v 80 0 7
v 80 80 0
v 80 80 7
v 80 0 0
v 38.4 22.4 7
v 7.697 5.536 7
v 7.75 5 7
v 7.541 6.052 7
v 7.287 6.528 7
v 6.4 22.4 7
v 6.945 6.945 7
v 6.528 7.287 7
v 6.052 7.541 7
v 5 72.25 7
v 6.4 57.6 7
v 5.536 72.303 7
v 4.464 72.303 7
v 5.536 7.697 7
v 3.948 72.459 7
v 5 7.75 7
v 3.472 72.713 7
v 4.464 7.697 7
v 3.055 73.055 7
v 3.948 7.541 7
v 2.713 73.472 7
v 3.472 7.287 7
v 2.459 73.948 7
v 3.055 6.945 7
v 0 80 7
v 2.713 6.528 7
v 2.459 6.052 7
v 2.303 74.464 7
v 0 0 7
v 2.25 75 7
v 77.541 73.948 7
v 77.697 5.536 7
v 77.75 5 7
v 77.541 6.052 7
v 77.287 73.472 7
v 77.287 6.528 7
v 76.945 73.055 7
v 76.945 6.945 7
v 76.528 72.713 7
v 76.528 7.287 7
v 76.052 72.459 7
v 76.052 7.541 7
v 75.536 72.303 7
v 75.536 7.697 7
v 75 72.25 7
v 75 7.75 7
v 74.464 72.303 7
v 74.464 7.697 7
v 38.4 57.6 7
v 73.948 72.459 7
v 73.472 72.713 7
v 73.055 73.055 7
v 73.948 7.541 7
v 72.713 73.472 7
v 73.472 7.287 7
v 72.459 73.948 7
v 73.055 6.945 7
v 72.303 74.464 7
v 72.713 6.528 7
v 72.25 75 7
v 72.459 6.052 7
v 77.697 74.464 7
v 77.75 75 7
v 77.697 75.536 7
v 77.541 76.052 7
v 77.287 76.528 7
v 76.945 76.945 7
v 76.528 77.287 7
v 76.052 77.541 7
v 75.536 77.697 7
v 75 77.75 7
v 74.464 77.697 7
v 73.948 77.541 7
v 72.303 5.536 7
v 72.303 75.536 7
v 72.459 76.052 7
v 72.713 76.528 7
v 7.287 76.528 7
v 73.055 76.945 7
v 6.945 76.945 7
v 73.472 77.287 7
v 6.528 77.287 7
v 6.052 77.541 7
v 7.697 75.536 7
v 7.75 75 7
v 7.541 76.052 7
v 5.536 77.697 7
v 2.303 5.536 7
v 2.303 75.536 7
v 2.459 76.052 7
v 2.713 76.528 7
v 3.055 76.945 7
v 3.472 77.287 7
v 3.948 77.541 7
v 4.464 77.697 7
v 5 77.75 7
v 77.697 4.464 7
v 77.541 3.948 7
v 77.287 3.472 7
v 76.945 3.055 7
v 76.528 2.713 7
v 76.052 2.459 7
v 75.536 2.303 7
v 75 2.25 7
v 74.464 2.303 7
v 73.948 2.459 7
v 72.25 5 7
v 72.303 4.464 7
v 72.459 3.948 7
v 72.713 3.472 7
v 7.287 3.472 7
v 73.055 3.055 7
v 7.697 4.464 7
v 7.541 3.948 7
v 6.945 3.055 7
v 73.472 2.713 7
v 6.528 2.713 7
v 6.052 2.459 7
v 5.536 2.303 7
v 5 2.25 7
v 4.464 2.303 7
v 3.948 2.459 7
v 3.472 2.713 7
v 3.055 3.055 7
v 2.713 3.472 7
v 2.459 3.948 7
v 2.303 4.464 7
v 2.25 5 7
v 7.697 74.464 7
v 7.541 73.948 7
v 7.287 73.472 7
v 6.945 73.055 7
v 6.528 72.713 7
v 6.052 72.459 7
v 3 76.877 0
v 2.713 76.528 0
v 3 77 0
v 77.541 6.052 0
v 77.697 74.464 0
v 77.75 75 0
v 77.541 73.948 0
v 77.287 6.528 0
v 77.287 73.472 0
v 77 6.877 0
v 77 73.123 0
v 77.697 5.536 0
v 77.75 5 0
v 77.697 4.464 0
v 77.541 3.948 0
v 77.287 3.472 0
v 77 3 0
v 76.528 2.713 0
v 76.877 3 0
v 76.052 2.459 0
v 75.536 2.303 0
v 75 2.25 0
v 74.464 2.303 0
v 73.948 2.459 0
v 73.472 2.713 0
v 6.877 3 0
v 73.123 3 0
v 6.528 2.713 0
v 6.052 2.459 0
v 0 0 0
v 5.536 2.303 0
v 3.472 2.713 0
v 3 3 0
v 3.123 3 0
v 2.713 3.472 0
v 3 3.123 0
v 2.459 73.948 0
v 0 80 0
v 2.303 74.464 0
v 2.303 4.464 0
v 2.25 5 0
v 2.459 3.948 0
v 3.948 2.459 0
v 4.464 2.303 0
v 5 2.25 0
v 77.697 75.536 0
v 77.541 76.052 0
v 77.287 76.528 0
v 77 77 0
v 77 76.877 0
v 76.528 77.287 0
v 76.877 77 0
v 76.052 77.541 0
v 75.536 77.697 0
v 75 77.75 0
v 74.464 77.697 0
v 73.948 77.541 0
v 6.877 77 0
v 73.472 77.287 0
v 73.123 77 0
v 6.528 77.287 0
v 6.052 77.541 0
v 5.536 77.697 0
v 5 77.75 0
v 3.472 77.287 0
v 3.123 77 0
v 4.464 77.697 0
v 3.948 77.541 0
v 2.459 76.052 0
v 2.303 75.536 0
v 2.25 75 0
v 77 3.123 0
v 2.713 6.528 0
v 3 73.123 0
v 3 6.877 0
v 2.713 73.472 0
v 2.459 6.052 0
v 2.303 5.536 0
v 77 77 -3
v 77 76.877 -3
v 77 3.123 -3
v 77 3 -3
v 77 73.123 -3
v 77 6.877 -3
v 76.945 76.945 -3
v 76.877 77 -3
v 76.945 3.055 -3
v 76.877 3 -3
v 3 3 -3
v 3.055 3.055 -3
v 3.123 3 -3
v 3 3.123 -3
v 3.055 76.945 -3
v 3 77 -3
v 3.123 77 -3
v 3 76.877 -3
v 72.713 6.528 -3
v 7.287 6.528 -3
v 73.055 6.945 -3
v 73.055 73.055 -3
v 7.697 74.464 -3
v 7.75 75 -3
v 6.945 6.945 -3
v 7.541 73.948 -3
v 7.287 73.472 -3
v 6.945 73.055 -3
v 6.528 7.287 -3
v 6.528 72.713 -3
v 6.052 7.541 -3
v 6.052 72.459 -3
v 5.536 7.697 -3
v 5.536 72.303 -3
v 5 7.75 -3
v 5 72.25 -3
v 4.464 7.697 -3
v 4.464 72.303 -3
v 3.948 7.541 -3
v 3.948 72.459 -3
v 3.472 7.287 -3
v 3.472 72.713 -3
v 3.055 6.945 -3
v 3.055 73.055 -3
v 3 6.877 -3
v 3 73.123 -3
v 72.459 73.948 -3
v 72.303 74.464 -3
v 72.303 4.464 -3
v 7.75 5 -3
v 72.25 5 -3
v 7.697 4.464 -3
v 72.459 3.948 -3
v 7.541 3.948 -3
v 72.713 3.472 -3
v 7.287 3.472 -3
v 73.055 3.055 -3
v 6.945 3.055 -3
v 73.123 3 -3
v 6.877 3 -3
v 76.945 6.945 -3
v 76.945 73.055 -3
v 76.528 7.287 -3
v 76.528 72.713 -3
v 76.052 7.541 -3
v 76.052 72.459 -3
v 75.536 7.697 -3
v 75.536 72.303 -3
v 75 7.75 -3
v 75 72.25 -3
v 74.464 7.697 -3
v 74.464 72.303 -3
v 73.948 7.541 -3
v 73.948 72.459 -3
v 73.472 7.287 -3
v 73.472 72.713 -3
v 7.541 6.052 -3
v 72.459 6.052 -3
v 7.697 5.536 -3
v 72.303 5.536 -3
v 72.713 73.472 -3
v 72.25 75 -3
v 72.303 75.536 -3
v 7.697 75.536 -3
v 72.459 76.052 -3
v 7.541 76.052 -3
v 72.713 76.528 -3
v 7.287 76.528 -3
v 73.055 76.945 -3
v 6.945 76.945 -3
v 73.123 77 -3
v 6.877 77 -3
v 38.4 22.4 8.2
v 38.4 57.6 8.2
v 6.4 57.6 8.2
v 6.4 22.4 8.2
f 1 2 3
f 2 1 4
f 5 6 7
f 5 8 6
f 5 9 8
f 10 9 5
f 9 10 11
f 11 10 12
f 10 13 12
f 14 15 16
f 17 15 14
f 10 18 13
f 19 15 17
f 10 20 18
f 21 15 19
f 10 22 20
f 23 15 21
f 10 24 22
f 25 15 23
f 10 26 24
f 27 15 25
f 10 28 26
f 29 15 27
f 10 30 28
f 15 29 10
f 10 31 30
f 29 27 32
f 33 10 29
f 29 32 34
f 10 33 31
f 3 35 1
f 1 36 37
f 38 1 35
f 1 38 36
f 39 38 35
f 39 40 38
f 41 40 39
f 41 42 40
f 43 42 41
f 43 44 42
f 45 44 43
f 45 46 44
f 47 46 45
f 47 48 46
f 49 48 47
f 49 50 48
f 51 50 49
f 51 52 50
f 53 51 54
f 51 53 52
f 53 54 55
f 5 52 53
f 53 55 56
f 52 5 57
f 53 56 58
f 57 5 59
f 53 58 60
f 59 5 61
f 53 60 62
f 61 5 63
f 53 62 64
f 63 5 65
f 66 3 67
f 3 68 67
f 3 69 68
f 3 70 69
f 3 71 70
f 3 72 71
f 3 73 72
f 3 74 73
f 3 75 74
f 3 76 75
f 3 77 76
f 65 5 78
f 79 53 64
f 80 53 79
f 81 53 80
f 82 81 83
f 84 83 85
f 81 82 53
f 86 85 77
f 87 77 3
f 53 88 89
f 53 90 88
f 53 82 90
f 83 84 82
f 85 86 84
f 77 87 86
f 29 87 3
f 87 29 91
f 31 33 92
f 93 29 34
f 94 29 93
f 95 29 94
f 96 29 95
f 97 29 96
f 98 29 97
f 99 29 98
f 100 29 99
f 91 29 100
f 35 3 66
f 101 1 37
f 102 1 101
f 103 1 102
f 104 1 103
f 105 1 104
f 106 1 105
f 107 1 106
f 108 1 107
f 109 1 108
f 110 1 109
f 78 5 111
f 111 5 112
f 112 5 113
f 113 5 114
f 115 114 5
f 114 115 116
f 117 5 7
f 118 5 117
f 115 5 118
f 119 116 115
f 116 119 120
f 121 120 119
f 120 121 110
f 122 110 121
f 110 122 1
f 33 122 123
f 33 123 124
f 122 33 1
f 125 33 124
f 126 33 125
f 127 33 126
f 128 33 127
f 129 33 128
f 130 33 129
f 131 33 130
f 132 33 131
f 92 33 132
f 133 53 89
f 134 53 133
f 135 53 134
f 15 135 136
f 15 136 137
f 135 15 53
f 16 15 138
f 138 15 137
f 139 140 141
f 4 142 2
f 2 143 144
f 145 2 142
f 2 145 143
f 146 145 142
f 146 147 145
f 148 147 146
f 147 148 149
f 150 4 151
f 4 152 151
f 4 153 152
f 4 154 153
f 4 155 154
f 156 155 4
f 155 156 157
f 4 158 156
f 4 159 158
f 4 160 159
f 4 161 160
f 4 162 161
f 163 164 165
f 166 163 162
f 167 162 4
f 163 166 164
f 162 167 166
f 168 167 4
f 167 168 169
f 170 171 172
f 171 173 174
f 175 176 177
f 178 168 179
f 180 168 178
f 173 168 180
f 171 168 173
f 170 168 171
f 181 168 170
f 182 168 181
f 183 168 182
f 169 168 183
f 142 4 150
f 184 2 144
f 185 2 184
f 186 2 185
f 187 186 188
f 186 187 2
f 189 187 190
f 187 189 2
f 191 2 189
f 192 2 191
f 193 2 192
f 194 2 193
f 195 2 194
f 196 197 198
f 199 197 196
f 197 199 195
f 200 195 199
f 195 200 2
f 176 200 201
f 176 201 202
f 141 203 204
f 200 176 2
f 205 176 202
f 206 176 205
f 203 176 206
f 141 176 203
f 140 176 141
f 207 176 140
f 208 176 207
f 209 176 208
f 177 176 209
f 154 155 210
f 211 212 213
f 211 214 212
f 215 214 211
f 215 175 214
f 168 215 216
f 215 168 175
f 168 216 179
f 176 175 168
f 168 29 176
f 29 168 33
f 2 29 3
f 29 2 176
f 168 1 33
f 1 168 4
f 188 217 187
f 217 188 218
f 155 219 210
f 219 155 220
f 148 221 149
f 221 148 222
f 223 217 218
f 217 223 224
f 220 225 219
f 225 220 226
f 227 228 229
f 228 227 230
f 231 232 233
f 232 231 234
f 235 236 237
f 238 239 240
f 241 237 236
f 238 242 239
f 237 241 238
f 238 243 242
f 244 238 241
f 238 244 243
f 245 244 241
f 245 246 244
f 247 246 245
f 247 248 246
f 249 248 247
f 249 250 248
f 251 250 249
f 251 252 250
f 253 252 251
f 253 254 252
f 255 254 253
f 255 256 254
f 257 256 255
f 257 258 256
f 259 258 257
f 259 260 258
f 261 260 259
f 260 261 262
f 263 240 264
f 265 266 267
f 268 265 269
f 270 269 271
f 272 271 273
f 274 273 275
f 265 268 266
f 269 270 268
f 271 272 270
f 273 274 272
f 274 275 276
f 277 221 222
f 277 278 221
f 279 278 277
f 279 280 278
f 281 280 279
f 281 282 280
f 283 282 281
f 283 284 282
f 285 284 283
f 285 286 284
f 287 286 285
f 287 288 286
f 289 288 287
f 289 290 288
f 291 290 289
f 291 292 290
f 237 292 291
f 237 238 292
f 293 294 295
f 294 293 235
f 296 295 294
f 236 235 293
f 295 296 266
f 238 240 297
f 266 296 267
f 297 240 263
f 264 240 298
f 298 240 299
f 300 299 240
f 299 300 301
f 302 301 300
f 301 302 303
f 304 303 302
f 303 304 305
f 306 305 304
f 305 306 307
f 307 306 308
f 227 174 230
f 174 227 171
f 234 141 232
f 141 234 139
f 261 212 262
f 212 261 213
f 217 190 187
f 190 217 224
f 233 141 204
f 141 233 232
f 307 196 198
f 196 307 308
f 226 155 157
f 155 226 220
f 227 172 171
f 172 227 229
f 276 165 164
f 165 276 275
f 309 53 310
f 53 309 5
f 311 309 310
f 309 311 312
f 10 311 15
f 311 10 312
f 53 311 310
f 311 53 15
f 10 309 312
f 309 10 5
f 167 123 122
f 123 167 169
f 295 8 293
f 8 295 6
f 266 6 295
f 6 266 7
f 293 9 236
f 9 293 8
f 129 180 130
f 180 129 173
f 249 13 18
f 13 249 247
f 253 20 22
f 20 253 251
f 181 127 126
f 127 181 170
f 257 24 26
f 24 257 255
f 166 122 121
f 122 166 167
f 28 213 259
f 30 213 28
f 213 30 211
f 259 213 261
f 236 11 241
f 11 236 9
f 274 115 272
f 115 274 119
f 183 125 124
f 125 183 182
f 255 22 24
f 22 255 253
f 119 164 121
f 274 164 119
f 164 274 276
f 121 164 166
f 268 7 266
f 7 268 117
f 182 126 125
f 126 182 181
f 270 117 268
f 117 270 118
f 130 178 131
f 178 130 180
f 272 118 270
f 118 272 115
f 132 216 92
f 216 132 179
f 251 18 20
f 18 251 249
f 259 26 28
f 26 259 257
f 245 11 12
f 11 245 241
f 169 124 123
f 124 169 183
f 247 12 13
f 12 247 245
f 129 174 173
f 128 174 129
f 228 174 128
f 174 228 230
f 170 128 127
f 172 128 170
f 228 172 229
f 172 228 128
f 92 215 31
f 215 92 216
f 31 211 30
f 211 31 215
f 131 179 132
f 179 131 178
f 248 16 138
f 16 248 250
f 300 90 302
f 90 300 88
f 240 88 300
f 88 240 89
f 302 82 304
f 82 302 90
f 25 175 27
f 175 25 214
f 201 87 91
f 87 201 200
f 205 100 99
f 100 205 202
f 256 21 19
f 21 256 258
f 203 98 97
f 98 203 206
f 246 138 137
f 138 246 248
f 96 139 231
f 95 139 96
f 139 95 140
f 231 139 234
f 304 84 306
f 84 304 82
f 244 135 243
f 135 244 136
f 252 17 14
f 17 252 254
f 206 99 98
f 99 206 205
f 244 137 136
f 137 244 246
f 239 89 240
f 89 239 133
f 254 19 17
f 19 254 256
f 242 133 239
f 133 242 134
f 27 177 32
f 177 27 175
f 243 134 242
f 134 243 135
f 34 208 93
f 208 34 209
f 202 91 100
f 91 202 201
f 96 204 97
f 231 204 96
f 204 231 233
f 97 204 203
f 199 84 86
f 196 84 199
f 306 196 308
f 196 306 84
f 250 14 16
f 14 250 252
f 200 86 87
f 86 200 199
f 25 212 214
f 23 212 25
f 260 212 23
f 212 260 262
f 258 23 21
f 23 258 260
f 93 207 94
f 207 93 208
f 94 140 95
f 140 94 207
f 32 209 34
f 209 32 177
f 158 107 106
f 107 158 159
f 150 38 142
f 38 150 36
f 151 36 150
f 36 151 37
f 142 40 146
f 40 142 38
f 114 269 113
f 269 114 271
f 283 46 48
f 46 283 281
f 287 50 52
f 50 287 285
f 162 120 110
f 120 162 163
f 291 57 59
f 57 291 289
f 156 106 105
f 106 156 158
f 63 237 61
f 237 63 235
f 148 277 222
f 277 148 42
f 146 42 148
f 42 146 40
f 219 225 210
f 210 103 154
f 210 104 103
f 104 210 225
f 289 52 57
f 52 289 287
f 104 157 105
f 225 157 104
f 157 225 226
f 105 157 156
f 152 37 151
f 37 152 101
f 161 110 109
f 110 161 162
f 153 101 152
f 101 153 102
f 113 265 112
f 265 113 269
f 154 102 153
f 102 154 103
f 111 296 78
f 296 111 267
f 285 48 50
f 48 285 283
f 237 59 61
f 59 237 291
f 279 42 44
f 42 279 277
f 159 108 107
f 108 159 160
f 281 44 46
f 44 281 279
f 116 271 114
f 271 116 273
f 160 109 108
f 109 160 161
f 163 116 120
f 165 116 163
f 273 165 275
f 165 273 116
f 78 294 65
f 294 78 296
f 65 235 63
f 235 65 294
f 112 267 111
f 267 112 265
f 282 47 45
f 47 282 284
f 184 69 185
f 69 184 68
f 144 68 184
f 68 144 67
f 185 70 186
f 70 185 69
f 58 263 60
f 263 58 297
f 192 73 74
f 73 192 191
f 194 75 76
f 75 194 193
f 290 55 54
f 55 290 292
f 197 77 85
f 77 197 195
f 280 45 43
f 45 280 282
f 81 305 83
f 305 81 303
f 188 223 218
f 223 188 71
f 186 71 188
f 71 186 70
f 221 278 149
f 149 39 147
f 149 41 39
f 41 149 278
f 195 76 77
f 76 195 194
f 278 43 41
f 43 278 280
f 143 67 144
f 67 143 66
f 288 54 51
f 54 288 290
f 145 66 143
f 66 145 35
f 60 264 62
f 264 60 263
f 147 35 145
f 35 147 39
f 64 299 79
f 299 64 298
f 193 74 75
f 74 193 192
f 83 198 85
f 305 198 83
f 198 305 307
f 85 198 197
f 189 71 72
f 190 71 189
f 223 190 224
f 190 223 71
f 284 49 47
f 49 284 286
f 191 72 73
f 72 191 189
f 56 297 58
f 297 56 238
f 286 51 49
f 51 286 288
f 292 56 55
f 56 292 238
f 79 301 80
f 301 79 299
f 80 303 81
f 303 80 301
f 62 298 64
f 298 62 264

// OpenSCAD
$fn = 32;

// ----------------------------------------------------------------------
// Enclosure lid: 80 x 80 x 7 mm, 4 bolt holes
// ----------------------------------------------------------------------

// --- parameters (mm) ---
length = 80;              // lid length, X
width = 80;               // lid width, Y
plate_t = 7;              // lid plate thickness
bolt_d = 5.5;             // bolt clearance
boss_lip = 5;             // bolt hole inset from the corner
sink = 1;                 // overlap of the lip and ribs into the plate
lip_h = 4;                // lip height below the plate
lip_wall = 3;             // lip wall thickness
label_h = 1.2;            // raised marking pad

module plate() {
  cube([length, width, plate_t]);
  /* lip that drops into the housing opening, sunk into the plate */
  translate([lip_wall, lip_wall, -lip_h + sink]) cube([length - 2 * lip_wall, width - 2 * lip_wall, lip_h]);
  /* raised marking pad on top, sunk 1 mm into the plate */
  translate([length * 0.08, width * 0.28, plate_t - 1]) cube([length * 0.4, width * 0.44, label_h + 1]);
}

difference() {
  plate();
  /* bolt pattern matching the corner bosses */
  for (sx = [0, 1]) for (sy = [0, 1])
    translate([sx * (length - 2 * boss_lip) + boss_lip, sy * (width - 2 * boss_lip) + boss_lip, -lip_h - 1])
      cylinder(h = plate_t + lip_h + 2, d = bolt_d);
}
